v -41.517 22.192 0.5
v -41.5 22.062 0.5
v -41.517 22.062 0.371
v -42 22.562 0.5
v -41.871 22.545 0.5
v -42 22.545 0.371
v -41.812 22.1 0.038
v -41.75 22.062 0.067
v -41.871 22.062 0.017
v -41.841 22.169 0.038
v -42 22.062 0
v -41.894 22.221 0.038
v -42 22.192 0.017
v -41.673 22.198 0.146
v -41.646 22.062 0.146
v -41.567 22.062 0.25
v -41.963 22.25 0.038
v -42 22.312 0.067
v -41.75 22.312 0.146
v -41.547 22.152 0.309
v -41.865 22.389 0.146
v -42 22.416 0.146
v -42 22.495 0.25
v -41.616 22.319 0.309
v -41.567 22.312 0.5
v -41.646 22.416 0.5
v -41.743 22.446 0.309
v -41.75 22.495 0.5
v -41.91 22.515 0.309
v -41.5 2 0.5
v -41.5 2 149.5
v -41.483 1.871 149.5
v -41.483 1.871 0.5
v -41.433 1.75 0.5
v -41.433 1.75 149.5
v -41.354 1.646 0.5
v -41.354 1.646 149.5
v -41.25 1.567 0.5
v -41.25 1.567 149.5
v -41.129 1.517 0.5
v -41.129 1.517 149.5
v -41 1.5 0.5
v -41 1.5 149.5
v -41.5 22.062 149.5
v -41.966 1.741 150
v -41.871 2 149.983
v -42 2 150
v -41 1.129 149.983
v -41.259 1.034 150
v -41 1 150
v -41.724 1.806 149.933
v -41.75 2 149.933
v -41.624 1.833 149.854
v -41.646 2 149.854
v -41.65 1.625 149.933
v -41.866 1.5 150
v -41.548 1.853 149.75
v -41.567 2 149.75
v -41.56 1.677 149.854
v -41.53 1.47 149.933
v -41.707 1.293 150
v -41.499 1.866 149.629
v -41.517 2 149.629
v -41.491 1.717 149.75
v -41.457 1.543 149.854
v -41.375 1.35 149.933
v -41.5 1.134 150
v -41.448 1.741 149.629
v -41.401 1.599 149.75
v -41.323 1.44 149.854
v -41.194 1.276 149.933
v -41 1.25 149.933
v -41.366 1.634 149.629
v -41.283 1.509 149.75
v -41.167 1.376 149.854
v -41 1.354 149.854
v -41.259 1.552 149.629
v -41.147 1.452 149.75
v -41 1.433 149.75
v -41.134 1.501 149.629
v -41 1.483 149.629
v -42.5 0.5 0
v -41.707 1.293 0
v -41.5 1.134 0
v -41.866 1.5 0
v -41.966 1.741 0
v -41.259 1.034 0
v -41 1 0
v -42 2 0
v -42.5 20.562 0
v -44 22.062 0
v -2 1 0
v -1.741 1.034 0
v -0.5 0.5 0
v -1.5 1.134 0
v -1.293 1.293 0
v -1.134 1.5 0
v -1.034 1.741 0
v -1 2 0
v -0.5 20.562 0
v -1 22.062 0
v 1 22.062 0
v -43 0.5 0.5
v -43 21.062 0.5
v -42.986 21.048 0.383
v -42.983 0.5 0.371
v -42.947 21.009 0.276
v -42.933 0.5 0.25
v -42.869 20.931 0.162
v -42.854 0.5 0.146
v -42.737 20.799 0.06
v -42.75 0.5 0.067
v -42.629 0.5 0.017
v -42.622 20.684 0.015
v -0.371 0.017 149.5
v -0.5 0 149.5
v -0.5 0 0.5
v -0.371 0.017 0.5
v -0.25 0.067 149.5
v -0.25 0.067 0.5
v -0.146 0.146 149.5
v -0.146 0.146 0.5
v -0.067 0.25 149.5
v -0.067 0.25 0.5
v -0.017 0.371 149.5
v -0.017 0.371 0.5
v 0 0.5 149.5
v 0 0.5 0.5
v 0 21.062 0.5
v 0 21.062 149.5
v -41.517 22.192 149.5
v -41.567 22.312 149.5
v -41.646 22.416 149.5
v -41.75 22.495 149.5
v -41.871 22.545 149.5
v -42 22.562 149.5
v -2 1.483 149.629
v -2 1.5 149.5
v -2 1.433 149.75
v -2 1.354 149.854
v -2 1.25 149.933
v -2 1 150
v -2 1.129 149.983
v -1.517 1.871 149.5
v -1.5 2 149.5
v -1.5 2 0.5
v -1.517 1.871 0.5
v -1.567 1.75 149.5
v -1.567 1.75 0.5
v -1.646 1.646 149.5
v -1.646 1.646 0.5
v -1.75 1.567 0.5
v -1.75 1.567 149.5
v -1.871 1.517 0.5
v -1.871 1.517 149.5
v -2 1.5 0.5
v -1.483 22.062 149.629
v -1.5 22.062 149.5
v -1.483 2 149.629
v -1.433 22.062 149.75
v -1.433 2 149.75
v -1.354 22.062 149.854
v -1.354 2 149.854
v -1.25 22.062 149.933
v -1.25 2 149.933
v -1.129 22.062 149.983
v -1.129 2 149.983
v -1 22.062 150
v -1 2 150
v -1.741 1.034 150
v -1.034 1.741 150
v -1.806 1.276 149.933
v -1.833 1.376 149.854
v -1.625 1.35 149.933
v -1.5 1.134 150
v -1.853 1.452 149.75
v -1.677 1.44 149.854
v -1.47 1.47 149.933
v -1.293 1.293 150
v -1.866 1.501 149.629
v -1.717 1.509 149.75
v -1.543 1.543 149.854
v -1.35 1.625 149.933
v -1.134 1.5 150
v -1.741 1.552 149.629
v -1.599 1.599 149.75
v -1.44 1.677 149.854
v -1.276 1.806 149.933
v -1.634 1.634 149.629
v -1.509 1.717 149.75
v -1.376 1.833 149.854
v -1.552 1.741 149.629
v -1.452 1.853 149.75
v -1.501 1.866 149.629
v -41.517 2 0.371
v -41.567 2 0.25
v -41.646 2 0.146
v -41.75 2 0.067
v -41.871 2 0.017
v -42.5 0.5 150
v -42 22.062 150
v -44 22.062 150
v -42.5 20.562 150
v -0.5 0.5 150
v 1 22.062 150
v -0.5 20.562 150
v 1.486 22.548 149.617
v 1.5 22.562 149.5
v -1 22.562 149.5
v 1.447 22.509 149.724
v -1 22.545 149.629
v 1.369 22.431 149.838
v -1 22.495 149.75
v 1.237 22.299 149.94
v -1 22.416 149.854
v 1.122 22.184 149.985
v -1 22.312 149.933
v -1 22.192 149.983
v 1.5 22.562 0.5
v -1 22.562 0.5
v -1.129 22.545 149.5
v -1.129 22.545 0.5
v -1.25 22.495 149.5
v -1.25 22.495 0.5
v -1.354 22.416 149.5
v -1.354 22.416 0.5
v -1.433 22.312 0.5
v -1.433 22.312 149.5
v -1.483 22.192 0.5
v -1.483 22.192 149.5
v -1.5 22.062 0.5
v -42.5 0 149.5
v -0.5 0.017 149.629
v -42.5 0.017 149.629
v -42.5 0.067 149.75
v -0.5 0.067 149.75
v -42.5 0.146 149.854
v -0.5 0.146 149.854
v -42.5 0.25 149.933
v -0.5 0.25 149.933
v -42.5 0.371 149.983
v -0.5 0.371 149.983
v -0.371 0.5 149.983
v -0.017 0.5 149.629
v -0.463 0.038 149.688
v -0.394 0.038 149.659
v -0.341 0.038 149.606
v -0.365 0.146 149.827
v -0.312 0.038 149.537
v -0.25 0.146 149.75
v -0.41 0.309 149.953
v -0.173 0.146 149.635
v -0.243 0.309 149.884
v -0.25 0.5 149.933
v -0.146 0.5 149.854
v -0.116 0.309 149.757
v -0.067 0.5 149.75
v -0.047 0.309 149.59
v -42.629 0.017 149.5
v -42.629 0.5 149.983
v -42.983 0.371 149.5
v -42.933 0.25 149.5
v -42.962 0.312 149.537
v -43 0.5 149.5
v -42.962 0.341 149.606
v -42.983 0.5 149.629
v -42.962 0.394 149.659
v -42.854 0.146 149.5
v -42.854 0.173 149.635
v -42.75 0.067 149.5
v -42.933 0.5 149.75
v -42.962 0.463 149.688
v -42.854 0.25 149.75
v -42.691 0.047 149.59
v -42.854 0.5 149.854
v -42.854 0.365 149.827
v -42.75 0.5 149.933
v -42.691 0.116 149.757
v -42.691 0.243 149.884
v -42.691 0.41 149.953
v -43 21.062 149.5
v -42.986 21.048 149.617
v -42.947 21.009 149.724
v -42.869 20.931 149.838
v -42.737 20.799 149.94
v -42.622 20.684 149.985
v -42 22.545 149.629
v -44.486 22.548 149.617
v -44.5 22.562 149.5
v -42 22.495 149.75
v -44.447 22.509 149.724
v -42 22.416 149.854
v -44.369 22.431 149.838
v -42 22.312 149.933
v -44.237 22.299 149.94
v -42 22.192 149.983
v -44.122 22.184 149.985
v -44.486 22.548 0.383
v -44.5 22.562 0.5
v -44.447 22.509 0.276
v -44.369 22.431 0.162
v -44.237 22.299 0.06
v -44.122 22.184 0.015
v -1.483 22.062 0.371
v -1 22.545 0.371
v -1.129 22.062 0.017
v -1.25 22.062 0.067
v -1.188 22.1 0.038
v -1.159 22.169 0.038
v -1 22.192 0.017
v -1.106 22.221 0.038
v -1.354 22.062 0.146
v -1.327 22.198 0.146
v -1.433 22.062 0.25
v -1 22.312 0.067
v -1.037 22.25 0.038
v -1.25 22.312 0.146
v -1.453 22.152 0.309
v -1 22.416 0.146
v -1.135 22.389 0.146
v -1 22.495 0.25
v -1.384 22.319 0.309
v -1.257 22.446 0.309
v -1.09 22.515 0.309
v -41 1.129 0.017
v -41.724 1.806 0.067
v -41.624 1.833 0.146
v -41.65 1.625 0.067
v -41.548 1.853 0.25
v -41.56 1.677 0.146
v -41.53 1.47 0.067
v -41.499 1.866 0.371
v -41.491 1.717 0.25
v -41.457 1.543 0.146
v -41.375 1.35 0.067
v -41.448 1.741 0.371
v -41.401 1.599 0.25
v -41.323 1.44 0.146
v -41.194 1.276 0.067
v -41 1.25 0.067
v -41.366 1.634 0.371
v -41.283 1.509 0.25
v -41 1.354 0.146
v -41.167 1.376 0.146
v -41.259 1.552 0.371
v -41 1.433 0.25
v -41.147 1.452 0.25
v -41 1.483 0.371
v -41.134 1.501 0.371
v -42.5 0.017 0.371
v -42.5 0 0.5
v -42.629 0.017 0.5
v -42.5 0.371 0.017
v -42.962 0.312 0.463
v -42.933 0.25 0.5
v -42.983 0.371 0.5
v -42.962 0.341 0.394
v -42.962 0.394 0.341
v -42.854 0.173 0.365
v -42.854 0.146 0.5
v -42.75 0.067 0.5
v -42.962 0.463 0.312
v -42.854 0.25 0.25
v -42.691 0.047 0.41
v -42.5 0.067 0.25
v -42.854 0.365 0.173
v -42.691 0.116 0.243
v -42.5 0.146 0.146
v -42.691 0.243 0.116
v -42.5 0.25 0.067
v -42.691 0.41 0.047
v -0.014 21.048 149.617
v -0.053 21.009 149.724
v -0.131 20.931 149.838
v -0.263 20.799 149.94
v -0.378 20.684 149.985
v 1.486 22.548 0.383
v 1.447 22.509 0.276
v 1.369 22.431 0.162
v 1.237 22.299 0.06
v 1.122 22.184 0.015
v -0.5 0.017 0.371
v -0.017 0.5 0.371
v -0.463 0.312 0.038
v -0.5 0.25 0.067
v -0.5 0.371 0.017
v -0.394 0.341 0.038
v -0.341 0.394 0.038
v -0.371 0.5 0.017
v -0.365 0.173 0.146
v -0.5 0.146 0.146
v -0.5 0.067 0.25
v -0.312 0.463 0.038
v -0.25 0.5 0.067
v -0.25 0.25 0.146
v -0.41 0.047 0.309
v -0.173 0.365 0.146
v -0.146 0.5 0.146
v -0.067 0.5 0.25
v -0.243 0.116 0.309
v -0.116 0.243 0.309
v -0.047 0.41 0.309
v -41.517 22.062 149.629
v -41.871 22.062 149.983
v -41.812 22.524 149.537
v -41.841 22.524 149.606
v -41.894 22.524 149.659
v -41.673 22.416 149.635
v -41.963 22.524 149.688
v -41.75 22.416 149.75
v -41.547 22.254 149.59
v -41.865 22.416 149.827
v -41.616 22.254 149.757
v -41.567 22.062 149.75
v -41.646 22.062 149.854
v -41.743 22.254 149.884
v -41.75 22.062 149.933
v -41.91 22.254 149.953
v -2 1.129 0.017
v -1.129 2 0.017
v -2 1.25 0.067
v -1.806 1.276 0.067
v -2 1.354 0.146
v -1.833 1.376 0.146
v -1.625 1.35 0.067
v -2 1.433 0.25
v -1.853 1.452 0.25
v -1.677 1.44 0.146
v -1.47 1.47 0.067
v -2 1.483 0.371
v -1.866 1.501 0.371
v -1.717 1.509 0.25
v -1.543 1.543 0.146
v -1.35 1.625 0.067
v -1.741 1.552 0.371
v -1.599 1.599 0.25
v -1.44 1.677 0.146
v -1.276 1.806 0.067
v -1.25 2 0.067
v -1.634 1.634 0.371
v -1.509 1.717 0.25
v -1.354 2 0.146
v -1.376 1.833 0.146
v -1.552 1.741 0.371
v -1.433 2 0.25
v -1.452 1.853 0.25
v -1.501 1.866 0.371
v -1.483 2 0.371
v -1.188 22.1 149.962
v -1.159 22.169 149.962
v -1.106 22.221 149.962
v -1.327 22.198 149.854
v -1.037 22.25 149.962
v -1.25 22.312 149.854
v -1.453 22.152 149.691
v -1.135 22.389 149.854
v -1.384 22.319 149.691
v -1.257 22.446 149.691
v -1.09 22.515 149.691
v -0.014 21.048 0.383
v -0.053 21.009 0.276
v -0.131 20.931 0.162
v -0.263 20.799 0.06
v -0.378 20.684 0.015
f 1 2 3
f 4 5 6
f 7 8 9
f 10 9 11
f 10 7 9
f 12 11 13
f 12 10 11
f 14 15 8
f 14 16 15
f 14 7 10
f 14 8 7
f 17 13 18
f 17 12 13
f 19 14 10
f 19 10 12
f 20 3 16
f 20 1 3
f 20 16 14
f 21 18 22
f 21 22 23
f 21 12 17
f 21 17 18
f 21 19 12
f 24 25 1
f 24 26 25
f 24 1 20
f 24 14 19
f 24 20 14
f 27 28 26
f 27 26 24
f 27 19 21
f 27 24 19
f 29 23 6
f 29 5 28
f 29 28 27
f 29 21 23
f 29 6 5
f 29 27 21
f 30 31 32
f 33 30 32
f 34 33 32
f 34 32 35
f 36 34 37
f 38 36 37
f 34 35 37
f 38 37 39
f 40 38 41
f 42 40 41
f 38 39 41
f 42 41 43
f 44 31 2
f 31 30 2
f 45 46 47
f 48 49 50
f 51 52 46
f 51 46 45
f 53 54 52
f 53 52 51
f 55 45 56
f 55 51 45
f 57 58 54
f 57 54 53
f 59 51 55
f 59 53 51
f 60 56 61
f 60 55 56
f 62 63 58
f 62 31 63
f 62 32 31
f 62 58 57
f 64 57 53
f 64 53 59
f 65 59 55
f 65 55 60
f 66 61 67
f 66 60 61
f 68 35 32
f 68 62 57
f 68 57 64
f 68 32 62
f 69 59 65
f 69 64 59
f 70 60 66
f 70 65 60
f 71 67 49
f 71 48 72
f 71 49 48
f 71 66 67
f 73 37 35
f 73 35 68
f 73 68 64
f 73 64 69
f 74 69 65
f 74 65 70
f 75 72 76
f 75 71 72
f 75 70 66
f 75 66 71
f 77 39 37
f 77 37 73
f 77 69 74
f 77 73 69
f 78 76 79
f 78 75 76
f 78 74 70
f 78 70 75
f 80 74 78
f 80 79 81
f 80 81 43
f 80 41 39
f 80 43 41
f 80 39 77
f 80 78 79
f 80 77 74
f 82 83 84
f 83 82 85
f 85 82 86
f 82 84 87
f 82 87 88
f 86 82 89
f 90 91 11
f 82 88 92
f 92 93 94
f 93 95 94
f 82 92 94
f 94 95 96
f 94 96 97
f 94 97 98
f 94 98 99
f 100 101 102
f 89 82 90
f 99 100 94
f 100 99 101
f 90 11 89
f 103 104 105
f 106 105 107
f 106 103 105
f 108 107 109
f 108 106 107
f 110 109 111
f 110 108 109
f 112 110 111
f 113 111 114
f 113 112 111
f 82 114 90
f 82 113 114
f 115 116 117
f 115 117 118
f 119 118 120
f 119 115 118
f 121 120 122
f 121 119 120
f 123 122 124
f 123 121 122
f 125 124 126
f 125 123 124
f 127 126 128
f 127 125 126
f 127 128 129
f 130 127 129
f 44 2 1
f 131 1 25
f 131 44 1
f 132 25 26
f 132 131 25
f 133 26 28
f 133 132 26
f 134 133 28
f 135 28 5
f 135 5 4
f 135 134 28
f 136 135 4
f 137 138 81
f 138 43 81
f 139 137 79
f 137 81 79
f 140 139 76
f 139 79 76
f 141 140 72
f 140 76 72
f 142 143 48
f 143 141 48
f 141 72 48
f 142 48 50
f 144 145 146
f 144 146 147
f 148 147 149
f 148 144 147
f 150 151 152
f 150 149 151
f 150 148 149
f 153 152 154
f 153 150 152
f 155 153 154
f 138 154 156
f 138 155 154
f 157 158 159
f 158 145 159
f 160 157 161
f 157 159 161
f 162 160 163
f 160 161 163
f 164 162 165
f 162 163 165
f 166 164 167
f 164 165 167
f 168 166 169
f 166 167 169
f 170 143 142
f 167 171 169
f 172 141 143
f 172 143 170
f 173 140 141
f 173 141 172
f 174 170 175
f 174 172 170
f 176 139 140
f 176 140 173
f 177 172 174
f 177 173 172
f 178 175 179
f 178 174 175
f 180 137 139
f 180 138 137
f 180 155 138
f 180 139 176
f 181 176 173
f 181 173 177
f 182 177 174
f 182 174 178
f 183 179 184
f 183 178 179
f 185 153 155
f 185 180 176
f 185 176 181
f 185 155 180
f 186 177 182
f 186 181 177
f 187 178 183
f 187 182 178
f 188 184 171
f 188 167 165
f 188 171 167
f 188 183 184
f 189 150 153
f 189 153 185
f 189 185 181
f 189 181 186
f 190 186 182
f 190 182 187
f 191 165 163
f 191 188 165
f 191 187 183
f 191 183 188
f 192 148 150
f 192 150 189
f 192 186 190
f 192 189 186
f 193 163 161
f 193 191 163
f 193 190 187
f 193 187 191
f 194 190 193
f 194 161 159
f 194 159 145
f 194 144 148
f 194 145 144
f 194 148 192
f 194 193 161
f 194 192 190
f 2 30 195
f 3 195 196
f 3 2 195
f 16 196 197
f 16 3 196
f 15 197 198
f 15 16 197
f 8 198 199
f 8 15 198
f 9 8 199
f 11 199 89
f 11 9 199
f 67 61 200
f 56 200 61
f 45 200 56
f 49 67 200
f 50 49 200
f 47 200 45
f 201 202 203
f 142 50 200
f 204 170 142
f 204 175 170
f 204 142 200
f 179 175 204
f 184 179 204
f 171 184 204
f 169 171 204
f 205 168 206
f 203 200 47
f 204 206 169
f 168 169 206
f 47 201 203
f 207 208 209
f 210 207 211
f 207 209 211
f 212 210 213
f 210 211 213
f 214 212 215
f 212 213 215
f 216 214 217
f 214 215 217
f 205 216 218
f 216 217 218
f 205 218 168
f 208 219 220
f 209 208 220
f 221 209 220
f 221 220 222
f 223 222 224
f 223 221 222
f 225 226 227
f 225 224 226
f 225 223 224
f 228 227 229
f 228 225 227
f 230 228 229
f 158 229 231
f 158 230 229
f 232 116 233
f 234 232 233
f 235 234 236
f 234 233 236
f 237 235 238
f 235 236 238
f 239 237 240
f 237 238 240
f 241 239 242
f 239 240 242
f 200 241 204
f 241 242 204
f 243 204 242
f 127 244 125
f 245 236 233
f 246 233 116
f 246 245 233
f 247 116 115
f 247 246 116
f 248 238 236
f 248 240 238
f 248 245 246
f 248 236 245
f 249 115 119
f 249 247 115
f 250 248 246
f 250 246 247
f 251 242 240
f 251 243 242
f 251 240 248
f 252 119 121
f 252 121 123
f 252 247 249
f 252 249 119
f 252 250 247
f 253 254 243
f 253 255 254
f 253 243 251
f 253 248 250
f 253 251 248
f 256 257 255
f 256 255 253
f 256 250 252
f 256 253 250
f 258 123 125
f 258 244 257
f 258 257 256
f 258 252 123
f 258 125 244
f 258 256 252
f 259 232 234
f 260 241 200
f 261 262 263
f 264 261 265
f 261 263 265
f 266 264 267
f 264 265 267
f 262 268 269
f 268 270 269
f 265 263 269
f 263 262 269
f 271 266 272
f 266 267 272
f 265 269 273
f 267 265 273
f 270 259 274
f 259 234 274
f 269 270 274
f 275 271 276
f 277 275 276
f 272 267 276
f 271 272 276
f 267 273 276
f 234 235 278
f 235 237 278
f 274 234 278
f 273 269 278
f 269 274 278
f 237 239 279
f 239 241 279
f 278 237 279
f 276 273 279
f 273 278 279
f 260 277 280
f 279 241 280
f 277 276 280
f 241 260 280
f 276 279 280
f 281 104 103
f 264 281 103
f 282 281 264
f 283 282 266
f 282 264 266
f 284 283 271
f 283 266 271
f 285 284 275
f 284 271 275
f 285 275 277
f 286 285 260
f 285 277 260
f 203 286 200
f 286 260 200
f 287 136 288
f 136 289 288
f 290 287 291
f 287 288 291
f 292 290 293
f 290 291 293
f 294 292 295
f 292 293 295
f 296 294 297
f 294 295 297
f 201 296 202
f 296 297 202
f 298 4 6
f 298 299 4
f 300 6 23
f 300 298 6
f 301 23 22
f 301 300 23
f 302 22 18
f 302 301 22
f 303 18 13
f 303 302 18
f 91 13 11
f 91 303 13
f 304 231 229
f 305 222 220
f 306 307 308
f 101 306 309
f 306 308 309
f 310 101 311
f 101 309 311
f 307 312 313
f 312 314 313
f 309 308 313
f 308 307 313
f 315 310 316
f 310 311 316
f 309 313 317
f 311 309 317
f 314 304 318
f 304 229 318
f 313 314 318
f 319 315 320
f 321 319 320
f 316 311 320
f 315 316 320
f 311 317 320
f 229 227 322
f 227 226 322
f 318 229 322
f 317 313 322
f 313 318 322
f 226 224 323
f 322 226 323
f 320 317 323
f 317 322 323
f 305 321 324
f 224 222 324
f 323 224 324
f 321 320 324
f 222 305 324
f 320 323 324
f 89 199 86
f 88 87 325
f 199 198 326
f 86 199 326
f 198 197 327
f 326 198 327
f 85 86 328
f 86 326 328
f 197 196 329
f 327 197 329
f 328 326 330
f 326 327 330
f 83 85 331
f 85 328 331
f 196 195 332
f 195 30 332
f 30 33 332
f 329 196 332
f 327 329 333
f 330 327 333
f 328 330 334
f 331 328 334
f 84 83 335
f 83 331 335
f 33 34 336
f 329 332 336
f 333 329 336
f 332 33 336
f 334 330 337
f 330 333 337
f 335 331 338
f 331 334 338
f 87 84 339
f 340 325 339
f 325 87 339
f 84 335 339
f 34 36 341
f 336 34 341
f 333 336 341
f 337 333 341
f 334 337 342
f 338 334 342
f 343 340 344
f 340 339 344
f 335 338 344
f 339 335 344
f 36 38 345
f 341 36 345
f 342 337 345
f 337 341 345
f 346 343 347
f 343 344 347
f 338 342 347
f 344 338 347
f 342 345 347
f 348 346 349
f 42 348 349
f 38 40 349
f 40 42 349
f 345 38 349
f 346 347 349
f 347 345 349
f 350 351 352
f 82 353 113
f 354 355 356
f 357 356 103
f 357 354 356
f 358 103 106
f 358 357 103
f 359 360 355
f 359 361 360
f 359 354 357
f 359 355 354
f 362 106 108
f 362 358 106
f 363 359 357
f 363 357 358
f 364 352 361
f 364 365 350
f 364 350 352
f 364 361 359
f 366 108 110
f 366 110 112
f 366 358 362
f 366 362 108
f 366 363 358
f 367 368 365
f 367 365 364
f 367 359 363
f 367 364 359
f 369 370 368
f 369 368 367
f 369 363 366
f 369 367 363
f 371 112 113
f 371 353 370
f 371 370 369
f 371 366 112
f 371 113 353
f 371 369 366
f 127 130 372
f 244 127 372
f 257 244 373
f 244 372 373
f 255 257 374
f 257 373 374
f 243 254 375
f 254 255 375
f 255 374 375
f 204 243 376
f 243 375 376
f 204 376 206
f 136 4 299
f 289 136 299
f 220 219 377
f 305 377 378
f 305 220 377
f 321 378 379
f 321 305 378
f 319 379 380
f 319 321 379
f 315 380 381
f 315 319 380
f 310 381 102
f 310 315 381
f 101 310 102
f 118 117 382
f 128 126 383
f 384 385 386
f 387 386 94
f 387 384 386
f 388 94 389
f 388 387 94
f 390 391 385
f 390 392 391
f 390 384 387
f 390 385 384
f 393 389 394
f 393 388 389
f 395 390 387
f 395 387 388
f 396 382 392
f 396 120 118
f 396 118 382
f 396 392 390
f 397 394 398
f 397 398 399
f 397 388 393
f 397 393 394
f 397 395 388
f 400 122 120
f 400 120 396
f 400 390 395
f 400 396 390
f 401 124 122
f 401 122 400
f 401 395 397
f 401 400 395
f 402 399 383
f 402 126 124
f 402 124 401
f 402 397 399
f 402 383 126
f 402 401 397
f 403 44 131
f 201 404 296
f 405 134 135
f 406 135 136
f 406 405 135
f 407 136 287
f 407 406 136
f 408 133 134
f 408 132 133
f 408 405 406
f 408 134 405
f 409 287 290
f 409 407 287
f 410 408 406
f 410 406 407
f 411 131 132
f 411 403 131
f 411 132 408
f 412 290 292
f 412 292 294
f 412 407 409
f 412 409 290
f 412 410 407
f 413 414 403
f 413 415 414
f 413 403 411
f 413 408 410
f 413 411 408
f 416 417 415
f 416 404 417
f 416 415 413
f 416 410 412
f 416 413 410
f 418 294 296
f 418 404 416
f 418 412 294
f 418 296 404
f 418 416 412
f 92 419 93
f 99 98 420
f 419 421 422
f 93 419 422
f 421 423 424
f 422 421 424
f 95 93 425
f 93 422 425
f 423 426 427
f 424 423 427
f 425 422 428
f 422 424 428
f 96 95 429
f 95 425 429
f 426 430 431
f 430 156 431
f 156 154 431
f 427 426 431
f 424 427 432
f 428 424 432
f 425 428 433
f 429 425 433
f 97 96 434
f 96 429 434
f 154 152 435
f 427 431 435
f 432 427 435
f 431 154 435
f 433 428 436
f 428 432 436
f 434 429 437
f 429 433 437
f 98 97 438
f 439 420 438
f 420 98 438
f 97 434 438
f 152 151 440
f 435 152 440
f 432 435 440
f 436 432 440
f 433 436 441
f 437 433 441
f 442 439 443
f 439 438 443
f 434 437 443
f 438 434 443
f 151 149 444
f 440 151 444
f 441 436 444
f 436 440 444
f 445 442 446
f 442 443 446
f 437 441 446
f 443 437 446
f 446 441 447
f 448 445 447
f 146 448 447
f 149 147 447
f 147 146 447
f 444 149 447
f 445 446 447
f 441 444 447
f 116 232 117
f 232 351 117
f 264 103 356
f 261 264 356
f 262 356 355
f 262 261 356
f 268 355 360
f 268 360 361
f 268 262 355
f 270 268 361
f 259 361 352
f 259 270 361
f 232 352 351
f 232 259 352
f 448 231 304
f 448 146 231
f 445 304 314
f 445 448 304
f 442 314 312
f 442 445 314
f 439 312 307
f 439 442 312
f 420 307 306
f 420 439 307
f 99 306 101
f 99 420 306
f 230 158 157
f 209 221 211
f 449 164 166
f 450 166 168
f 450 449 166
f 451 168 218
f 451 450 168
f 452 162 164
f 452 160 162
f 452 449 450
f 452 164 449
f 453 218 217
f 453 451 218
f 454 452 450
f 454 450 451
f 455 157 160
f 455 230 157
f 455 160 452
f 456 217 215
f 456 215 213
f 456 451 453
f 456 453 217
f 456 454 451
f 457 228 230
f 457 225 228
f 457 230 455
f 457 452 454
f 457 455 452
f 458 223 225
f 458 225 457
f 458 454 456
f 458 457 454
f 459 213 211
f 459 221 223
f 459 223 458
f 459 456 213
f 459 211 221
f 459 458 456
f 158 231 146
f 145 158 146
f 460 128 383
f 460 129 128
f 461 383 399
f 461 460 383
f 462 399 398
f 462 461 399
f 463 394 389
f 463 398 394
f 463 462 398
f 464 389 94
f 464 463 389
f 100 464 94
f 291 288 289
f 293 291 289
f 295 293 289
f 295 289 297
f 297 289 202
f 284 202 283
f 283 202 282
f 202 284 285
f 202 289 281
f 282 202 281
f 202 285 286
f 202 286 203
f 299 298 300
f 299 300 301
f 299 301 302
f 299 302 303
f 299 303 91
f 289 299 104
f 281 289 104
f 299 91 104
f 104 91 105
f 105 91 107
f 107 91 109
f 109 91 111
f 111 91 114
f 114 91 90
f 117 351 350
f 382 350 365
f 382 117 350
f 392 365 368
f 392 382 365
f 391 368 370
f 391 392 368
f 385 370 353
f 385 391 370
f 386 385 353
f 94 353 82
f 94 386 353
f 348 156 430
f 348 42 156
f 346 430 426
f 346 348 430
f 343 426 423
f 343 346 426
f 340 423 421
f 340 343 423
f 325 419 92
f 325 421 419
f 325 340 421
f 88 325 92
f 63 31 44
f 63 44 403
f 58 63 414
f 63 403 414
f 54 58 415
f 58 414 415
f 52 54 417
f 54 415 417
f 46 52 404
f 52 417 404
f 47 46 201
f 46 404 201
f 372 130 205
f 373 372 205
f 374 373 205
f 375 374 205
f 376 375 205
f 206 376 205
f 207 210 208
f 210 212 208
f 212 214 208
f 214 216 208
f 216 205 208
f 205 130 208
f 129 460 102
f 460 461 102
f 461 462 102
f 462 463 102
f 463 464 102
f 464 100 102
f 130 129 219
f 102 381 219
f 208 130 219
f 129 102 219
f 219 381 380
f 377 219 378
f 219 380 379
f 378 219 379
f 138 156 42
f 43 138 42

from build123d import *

# Parameters (mm, degrees)
F1_DEPTH = 150
F2_R     = 0.5


with BuildPart() as f1:
    # F0 (on Top) → F1 (new body)
    with BuildSketch(Plane.XY):
        Polygon((-41.5, 1.5), (-41.5, 22.562249), (-44.5, 22.562249), (-43, 21.062249), (-43, 0), (0, 0), (0, 21.062249), (1.5, 22.562249), (-1.5, 22.562249), (-1.5, 1.5), align=None)
    extrude(amount=F1_DEPTH)

    # F2
    f2_edges = [f1.edges().sort_by_distance(p)[0] for p in [
        (-1.5, 22.562249, 75),
        (-1.5, 12.031124, 150),
        (-1.5, 1.5, 75),
        (0, 10.531124, 150),
        (-21.5, 0, 150),
        (-41.5, 12.031124, 150),
        (-41.5, 22.562249, 75),
        (-21.5, 1.5, 0),
        (-21.5, 1.5, 150),
        (-41.5, 1.5, 75),
        (0, 0, 75),
        (-21.5, 0, 0),
        (0, 10.531124, 0),
        (-43, 0, 75),
        (-43, 10.531124, 150),
        (-43, 10.531124, 0),
        (-41.5, 12.031124, 0),
        (-1.5, 12.031124, 0),
        (-43, 22.562249, 150),
        (0, 22.562249, 150),
        (0, 22.562249, 0),
        (-43, 22.562249, 0),
    ]]
    fillet(f2_edges, radius=F2_R)


solid = f1.part
